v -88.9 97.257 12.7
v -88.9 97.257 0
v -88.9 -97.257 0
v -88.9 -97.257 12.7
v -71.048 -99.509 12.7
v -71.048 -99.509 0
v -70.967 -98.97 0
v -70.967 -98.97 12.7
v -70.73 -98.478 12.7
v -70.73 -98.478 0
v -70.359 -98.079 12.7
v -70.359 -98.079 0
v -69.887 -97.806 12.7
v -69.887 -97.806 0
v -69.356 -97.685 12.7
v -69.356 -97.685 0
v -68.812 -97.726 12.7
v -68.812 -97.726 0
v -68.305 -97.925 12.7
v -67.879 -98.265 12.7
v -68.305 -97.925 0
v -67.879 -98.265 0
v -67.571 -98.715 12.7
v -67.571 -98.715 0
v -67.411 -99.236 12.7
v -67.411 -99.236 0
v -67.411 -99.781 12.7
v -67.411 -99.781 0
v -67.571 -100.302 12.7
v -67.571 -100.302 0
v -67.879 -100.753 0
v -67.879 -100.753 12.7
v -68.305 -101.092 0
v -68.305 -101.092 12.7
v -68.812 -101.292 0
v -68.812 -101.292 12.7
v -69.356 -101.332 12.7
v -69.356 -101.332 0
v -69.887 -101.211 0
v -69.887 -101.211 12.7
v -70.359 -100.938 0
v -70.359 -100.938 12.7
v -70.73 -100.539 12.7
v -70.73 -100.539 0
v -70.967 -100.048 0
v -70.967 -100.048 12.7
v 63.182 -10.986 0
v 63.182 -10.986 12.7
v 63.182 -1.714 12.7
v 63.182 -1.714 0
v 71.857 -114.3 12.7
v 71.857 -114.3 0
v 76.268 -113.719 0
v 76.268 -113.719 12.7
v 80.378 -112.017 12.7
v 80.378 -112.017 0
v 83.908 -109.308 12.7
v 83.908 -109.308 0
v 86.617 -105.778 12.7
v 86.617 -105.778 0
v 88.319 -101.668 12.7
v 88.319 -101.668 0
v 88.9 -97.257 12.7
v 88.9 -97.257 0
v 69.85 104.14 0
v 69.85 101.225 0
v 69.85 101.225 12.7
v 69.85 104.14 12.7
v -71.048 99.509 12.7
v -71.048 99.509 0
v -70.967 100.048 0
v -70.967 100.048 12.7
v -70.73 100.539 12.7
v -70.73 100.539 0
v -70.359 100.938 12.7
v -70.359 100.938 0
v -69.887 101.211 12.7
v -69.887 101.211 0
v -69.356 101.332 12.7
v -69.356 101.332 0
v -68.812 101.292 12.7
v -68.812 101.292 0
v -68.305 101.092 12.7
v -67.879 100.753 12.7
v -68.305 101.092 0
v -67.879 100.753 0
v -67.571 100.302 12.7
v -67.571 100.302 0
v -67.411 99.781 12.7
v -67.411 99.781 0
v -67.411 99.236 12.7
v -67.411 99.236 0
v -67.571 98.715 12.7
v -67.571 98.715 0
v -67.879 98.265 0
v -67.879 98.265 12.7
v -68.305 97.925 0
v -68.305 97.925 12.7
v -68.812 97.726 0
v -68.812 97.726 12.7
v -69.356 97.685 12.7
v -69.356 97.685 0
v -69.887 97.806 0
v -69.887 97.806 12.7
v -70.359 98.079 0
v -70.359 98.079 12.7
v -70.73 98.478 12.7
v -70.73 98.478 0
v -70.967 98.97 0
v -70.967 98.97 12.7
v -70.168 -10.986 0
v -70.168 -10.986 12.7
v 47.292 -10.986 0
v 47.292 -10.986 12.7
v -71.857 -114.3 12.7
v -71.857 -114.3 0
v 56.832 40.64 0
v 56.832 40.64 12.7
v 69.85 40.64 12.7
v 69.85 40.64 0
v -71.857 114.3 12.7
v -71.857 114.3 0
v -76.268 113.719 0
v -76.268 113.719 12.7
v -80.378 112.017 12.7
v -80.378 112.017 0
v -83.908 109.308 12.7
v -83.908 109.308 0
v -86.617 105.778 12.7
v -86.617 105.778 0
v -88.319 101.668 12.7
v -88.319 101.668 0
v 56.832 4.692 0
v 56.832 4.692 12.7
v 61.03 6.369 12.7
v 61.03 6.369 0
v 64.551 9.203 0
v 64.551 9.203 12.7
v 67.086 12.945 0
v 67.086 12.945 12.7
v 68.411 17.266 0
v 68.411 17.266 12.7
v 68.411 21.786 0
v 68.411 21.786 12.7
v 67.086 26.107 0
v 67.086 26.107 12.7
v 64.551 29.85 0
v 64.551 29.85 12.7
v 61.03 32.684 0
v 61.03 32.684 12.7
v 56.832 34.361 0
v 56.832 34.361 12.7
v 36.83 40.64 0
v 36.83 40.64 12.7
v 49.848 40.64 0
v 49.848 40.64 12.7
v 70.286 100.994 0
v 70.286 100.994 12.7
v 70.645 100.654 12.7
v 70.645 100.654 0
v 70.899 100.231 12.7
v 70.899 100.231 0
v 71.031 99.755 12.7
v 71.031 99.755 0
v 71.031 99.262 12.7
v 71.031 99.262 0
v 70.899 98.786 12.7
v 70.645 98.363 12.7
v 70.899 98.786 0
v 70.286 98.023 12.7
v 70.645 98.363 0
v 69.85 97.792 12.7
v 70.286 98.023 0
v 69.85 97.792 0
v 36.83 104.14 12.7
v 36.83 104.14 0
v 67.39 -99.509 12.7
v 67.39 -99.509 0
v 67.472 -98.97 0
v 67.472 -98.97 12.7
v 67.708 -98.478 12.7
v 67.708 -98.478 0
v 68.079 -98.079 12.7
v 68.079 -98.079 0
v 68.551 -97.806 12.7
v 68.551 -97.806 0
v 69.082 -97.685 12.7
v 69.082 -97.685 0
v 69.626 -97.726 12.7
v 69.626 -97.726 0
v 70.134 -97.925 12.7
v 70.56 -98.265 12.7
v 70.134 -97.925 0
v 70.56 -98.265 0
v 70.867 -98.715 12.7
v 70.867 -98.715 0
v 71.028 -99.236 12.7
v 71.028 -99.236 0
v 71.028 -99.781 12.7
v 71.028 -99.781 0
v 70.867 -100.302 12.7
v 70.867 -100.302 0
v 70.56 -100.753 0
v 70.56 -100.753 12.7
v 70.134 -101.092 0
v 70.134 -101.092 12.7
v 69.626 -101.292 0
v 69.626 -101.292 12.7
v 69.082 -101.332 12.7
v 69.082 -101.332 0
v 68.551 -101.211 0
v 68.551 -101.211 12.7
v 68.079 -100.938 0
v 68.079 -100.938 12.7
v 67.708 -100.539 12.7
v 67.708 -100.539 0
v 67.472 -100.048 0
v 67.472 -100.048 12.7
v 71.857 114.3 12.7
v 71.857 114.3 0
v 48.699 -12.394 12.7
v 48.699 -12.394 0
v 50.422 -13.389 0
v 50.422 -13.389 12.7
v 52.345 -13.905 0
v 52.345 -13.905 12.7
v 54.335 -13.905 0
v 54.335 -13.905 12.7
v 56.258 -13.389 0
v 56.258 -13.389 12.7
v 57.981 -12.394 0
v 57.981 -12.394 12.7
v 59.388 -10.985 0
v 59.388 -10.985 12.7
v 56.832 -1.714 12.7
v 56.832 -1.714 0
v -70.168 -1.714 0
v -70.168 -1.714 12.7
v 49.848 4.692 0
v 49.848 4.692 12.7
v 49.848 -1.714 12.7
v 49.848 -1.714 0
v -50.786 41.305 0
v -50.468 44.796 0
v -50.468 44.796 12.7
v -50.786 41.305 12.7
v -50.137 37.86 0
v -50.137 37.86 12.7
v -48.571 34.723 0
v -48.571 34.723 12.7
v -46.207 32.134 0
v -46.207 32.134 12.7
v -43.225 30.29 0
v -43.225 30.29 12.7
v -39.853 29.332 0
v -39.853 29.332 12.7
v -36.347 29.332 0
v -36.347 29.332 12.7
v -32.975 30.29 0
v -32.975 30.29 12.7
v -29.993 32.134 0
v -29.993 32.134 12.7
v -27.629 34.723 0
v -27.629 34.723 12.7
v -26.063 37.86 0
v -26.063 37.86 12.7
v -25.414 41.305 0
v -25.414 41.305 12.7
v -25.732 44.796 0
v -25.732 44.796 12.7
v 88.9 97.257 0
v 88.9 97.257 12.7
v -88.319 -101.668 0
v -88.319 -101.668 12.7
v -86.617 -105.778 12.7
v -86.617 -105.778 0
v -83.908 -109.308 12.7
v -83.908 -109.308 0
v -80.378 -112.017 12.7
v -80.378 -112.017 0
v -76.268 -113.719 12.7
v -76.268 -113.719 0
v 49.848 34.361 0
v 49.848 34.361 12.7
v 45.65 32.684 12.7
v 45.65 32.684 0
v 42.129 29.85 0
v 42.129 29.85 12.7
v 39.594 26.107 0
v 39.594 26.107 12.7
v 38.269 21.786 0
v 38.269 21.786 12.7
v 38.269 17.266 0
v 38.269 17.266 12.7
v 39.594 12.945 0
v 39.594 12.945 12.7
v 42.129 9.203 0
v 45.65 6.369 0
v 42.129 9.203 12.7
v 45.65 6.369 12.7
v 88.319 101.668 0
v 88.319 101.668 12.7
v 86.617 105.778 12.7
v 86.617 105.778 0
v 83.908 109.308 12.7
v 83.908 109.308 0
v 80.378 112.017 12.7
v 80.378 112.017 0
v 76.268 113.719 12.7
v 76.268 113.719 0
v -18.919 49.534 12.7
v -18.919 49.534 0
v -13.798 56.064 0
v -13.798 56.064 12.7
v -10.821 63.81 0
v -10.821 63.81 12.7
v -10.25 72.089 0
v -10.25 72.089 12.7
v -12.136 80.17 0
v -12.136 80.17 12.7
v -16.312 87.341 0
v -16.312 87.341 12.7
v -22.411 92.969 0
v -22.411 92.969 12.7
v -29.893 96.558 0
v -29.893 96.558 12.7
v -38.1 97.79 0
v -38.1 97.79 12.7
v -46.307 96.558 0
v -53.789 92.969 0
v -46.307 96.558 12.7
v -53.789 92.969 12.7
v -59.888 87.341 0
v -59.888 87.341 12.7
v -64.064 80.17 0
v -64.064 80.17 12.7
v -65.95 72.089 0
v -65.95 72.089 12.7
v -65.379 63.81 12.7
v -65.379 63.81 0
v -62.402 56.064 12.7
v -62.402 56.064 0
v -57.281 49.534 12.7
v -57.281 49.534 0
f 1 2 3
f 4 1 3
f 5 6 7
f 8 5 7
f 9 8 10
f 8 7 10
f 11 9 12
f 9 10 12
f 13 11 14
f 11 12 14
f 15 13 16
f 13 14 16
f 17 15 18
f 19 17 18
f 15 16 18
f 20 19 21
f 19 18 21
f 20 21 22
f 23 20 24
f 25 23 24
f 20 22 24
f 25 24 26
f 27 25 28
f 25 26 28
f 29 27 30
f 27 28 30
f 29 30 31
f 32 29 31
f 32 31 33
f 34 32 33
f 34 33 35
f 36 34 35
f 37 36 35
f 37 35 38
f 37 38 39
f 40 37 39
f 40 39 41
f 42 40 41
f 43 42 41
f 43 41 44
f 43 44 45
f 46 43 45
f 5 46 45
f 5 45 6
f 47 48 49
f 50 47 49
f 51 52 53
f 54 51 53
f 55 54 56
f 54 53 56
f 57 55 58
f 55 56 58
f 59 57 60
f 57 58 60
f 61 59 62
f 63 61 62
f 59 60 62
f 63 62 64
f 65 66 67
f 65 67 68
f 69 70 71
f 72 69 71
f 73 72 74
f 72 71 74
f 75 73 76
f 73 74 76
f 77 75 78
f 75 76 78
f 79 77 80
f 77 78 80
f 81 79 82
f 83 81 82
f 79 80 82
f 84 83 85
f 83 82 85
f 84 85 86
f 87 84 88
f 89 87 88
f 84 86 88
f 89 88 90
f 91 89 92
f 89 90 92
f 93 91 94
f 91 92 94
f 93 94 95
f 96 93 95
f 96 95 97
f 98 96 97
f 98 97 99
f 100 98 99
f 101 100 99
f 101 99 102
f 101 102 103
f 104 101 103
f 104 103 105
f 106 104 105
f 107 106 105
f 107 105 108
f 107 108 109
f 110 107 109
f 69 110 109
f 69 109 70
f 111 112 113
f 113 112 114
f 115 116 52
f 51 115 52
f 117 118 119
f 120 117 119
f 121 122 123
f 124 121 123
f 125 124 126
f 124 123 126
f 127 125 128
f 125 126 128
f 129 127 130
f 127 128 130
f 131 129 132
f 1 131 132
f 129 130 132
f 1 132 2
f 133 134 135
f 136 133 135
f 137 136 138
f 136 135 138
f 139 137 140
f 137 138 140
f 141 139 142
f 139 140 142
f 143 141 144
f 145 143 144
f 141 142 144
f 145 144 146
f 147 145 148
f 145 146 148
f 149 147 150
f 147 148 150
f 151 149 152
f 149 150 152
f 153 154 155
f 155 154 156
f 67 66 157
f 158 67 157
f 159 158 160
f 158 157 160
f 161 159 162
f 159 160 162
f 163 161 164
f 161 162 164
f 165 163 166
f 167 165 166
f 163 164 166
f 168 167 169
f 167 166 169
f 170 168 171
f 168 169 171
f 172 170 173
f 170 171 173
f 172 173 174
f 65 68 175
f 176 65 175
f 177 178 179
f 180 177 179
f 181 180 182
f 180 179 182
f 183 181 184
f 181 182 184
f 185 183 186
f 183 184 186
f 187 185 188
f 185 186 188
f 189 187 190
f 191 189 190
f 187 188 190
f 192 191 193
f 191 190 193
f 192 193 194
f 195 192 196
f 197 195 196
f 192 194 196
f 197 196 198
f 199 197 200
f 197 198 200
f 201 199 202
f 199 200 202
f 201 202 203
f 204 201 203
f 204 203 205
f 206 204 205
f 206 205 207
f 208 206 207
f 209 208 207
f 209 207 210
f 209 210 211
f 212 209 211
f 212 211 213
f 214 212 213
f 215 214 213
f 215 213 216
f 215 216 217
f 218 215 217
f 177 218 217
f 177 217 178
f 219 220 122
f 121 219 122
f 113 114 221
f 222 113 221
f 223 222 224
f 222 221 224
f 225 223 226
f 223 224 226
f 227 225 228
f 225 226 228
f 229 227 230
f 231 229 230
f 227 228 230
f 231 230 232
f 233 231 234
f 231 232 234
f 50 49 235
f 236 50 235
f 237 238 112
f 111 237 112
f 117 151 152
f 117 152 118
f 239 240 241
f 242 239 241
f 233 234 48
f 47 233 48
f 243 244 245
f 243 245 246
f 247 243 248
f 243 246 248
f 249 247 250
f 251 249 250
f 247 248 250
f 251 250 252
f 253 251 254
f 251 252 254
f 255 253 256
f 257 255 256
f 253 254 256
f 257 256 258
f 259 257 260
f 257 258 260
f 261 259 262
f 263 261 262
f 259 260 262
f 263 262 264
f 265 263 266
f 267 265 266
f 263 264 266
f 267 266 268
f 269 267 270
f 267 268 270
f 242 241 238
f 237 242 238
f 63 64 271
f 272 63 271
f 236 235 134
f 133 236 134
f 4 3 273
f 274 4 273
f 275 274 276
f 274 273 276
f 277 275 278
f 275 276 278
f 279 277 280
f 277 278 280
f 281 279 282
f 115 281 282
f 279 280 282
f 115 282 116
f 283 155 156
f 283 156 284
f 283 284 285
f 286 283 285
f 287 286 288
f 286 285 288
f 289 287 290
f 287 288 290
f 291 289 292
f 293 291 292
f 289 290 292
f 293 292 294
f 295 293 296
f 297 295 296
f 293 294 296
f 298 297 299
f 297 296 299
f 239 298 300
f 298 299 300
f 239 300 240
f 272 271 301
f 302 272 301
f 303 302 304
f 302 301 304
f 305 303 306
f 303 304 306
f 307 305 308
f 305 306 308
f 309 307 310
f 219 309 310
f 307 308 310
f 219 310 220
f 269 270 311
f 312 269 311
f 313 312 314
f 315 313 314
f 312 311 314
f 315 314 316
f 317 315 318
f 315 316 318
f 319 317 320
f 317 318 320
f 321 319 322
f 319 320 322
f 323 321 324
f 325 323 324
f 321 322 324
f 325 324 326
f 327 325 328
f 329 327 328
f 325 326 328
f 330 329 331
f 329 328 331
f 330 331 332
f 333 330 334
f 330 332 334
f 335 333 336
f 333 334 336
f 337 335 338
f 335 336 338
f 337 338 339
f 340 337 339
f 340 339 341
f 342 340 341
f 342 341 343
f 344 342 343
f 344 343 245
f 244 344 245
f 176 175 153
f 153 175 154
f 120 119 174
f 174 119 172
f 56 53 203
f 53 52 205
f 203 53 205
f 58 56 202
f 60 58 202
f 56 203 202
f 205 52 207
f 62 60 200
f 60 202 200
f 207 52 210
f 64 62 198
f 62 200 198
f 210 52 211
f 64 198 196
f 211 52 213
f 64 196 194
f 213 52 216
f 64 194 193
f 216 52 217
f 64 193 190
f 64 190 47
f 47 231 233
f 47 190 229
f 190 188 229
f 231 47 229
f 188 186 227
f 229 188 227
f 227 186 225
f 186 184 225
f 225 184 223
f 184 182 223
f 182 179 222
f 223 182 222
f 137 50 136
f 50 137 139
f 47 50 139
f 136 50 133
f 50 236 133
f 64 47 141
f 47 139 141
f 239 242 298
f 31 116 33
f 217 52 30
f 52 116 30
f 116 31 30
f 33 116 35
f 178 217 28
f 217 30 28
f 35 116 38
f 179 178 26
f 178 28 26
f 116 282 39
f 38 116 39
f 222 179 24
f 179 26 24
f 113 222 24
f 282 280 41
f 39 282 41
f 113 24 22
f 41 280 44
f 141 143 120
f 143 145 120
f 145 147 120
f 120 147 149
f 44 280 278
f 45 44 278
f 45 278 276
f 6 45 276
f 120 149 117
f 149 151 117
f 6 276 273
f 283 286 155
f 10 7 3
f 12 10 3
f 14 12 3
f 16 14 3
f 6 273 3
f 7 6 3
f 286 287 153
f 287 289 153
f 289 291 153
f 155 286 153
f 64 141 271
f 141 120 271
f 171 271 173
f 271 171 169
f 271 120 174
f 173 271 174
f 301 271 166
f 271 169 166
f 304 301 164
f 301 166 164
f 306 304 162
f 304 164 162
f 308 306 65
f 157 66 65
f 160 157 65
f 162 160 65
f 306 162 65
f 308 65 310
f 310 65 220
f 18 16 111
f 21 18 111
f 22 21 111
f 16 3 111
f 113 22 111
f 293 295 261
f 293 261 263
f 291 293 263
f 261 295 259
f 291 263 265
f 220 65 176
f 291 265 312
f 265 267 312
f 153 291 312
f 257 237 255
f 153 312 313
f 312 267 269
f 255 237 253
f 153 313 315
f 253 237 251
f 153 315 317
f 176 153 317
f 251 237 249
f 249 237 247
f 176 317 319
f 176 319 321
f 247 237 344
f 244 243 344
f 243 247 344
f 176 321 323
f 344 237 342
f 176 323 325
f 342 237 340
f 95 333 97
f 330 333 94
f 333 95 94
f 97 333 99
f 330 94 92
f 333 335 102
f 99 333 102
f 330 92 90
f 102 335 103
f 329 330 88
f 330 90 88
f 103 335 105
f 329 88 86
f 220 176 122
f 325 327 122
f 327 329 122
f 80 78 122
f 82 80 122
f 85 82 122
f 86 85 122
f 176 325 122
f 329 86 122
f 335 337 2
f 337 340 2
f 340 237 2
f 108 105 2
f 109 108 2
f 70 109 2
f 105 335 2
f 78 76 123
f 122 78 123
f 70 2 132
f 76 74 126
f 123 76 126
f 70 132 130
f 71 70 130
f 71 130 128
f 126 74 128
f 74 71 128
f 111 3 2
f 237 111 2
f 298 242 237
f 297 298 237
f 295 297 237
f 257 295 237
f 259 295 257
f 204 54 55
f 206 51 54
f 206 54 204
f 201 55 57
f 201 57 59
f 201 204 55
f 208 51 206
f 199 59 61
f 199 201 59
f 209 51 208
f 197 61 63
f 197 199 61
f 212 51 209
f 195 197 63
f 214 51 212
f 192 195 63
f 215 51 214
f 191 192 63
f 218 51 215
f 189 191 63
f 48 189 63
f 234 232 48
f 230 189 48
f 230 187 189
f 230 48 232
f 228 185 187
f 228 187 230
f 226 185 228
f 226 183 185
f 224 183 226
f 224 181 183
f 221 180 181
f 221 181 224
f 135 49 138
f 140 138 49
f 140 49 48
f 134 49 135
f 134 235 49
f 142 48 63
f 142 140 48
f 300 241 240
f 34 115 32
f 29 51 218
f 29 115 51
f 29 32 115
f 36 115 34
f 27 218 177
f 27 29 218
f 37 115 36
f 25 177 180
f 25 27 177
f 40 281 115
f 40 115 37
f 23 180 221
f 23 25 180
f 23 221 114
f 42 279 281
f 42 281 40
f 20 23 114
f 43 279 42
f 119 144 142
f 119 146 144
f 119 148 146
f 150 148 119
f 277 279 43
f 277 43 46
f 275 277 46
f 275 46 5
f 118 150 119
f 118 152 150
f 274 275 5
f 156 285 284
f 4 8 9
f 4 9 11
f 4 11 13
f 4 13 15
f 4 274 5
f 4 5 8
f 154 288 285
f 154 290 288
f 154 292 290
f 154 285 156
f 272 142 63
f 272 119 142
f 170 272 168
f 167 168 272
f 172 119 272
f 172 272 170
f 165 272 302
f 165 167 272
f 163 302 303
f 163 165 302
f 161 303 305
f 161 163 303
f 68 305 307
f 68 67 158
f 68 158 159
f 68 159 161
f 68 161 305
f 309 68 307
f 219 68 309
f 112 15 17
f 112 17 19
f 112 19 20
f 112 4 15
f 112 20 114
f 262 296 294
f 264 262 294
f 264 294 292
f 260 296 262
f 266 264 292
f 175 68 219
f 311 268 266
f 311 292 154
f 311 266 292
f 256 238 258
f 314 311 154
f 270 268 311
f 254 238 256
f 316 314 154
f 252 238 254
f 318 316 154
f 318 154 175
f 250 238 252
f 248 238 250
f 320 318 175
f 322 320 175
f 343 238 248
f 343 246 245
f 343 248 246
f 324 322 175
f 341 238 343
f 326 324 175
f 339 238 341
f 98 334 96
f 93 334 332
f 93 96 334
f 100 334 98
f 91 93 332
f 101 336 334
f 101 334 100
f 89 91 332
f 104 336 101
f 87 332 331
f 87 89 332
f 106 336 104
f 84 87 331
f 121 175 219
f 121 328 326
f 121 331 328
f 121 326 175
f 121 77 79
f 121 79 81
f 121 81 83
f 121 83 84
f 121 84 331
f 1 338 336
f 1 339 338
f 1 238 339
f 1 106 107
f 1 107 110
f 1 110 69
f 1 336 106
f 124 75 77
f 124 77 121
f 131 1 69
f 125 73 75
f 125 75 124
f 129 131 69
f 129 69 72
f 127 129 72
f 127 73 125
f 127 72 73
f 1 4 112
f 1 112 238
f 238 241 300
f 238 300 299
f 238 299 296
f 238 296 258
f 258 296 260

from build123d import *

# Parameters (mm, degrees)
BOSS_EXTRUDE1_DEPTH         = 12.7
CUT_EXTRUDE1_DEPTH          = 13.7
F_27_0_144_DIAMETER_HOLE1_D = 3.6576


with BuildPart() as part:
    # Sketch1 → Boss-Extrude1 (new body)
    with BuildSketch(Plane(origin=(0, 0, 0), x_dir=(0, 1, 0), z_dir=(0, 0, 1))):
        with BuildLine():
            Line((-97.2566, -88.9), (97.2566, -88.9))
            ThreePointArc((97.2566, -88.9), (109.308103714, -83.908103714), (114.3, -71.8566))
            Line((114.3, -71.8566), (114.3, 71.8566))
            ThreePointArc((114.3, 71.8566), (109.308103714, 83.908103714), (97.2566, 88.9))
            Line((97.2566, 88.9), (-97.2566, 88.9))
            ThreePointArc((-97.2566, 88.9), (-109.308103714, 83.908103714), (-114.3, 71.8566))
            Line((-114.3, 71.8566), (-114.3, -71.8566))
            ThreePointArc((-114.3, -71.8566), (-109.308103714, -83.908103714), (-97.2566, -88.9))
        make_face()
    extrude(amount=BOSS_EXTRUDE1_DEPTH)

    # Sketch6 → Cut-Extrude1 (cut, through all)
    with BuildSketch(Plane.XY.offset(12.7)):
        with BuildLine():
            Line((49.8475, 4.691829089), (49.8475, -1.7145))
            Line((49.8475, -1.7145), (-70.1675, -1.7145))
            Line((-70.1675, -1.7145), (-70.1675, -10.9855))
            Line((-70.1675, -10.9855), (47.292145856, -10.9855))
            ThreePointArc((47.292145856, -10.9855), (53.34, -13.97), (59.387854144, -10.9855))
            Line((59.387854144, -10.9855), (63.1825, -10.9855))
            Line((63.1825, -10.9855), (63.1825, -1.7145))
            Line((63.1825, -1.7145), (56.8325, -1.7145))
            Line((56.8325, -1.7145), (56.8325, 4.691829089))
            ThreePointArc((56.8325, 4.691829089), (68.58, 19.52625), (56.8325, 34.360670911))
            Line((56.8325, 34.360670911), (56.8325, 40.64))
            Line((56.8325, 40.64), (69.85, 40.64))
            Line((69.85, 40.64), (69.85, 104.14))
            Line((69.85, 104.14), (36.83, 104.14))
            Line((36.83, 104.14), (36.83, 40.64))
            Line((36.83, 40.64), (49.8475, 40.64))
            Line((49.8475, 40.64), (49.8475, 34.360670911))
            ThreePointArc((49.8475, 34.360670911), (38.1, 19.52625), (49.8475, 4.691829089))
        make_face()
        with BuildLine():
            ThreePointArc((-25.732344403, 44.796363636), (-38.1, 97.79), (-50.467655597, 44.796363636))
            ThreePointArc((-50.467655597, 44.796363636), (-38.1, 29.21), (-25.732344403, 44.796363636))
        make_face()
    extrude(amount=-CUT_EXTRUDE1_DEPTH, mode=Mode.SUBTRACT)

    # #27 (0.144) Diameter Hole1 (through all)
    with Locations(Plane.XY.offset(12.7)):
        with Locations((-69.21913, 99.508615), (-69.21913, -99.508615), (69.21913, -99.508615), (69.21913, 99.508615)):
            Hole(F_27_0_144_DIAMETER_HOLE1_D / 2)


solid = part.part
